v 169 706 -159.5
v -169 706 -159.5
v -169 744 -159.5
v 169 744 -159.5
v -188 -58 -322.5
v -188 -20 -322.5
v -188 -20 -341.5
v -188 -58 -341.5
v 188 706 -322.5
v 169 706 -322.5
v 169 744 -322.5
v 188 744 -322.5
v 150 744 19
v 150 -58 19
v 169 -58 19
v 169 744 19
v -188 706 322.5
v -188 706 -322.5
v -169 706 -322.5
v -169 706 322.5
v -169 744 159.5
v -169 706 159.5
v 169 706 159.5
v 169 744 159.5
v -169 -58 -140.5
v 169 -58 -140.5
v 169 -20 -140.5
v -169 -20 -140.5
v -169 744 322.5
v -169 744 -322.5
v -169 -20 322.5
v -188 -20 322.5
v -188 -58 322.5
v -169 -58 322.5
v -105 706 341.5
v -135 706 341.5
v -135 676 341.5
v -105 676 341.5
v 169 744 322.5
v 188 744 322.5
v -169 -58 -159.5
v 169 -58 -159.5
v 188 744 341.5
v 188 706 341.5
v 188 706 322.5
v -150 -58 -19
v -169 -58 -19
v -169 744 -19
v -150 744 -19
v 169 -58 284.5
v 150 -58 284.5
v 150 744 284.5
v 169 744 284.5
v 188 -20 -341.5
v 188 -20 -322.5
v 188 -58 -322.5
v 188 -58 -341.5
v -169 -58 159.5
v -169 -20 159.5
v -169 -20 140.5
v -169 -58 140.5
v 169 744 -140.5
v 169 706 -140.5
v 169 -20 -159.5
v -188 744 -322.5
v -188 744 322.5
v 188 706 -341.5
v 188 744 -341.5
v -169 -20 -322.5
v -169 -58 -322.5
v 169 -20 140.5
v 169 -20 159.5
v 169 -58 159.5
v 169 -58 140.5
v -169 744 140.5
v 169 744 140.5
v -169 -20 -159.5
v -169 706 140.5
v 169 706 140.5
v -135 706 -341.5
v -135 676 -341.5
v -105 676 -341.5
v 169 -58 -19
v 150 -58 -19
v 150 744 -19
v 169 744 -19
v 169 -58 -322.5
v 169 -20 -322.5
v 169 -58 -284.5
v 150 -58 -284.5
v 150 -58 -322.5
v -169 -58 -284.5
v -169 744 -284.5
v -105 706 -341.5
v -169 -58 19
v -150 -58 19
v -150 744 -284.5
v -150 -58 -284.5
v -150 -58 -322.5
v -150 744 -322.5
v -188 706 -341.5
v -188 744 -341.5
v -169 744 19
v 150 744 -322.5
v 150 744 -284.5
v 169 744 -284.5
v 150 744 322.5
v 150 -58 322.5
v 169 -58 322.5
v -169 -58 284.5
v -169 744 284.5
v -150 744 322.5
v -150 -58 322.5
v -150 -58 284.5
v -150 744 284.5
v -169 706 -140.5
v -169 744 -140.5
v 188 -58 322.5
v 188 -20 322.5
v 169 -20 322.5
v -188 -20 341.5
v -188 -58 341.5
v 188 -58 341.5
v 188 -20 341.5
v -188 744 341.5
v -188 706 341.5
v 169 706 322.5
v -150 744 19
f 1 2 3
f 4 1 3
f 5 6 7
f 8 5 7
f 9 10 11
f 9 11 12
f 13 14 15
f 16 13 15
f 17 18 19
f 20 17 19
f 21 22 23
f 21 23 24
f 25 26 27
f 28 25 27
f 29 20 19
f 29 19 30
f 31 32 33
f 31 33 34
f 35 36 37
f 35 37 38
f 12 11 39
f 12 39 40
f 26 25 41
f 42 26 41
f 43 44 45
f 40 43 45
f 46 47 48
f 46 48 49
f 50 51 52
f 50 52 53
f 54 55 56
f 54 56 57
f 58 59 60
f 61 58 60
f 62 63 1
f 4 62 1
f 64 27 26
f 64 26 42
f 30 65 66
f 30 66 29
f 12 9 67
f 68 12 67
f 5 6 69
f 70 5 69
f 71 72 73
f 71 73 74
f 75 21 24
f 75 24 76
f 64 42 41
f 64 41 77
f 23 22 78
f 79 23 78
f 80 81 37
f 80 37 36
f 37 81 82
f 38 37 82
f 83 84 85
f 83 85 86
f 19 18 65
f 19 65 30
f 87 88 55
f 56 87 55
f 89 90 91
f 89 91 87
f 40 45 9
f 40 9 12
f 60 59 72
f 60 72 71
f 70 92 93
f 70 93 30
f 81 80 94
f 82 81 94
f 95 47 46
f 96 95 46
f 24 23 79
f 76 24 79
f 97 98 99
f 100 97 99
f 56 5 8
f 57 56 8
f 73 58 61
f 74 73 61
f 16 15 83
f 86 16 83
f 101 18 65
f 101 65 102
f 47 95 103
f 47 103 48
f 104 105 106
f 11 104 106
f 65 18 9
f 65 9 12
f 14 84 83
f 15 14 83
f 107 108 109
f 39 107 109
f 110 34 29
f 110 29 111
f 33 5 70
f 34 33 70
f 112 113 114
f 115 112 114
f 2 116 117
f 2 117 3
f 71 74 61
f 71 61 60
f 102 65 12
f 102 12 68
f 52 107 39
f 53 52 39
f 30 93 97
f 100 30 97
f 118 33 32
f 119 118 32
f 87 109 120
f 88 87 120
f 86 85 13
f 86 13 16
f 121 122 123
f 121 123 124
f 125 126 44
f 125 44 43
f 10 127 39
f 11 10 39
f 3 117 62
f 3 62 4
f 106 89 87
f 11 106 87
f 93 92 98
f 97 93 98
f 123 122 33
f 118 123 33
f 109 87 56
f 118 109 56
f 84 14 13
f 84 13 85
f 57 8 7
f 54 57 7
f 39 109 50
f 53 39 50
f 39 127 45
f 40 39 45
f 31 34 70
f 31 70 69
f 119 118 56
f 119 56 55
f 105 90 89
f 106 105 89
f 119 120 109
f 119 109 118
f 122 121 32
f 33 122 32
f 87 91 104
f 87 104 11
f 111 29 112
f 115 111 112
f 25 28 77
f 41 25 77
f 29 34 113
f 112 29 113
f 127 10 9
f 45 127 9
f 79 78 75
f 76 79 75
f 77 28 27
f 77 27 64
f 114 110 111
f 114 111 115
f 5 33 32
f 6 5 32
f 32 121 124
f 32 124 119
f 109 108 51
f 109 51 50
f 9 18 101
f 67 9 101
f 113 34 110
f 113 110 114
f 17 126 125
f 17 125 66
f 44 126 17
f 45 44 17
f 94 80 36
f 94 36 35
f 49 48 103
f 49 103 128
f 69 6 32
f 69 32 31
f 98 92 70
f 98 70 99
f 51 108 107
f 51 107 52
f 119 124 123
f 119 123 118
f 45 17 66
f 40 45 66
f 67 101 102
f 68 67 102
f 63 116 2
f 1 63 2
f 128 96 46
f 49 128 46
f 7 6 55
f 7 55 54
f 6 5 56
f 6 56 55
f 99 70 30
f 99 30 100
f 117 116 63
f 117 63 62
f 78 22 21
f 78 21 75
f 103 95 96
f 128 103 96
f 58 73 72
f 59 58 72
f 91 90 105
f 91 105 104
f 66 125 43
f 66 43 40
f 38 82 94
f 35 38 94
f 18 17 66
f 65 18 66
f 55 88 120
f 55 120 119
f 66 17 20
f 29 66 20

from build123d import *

# Parameters (mm, degrees)
EXTRUDE_1_DEPTH        = 322.5
EXTRUDE_1_DEPTH_BACK   = 322.5
SKETCH_6_W             = 19
SKETCH_6_H             = 38
EXTRUDE_1_2_DEPTH      = 322.5
EXTRUDE_1_2_DEPTH_BACK = 322.5
EXTRUDE_1_3_DEPTH      = 322.5
EXTRUDE_1_3_DEPTH_BACK = 322.5
EXTRUDE_1_4_DEPTH      = 322.5
EXTRUDE_1_4_DEPTH_BACK = 322.5
EXTRUDE_2_DEPTH        = 188
EXTRUDE_2_DEPTH_BACK   = 188
SKETCH_8_W             = 19
SKETCH_8_H             = 38
EXTRUDE_2_2_DEPTH      = 188
EXTRUDE_2_2_DEPTH_BACK = 188
EXTRUDE_2_3_DEPTH      = 188
EXTRUDE_2_3_DEPTH_BACK = 188
EXTRUDE_2_4_DEPTH      = 188
EXTRUDE_2_4_DEPTH_BACK = 188
EXTRUDE_START          = -58
SKETCH_9_W             = 19
SKETCH_9_H             = 38
EXTRUDE_2009_DEPTH     = 802
EXTRUDE_2009_2_DEPTH   = 802
EXTRUDE_2009_3_DEPTH   = 802
EXTRUDE_2009_4_DEPTH   = 802
EXTRUDE_2009_5_DEPTH   = 802
EXTRUDE_2009_6_DEPTH   = 802
EXTRUDE_START_2        = -341.5
SKETCH_10_W            = 30
SKETCH_10_H            = 30
EXTRUDE_4_DEPTH        = 683
EXTRUDE_5_DEPTH        = 169
EXTRUDE_5_DEPTH_BACK   = 169
SKETCH_11_W            = 19
SKETCH_11_H            = 38
EXTRUDE_5_2_DEPTH      = 169
EXTRUDE_5_2_DEPTH_BACK = 169
EXTRUDE_5_3_DEPTH      = 169
EXTRUDE_5_3_DEPTH_BACK = 169
EXTRUDE_5_4_DEPTH      = 169
EXTRUDE_5_4_DEPTH_BACK = 169


with BuildPart() as part:
    # ｽｹｯﾁ6 → ﾎﾞｽ - 押し出し1 (new, two sides: drawn at the far end of the back side and taken through both)
    with BuildSketch(Plane.XY.offset(-EXTRUDE_1_DEPTH_BACK)):
        with Locations((-178.5, -39)):
            Rectangle(SKETCH_6_W, SKETCH_6_H)
    extrude(amount=EXTRUDE_1_DEPTH + EXTRUDE_1_DEPTH_BACK)


with BuildPart() as body_2:
    # ｽｹｯﾁ6 → Extrude 1 2 (new, two sides: drawn at the far end of the back side and taken through both)
    with BuildSketch(Plane.XY.offset(-EXTRUDE_1_2_DEPTH_BACK)):
        with Locations((178.5, -39)):
            Rectangle(SKETCH_6_W, SKETCH_6_H)
    extrude(amount=EXTRUDE_1_2_DEPTH + EXTRUDE_1_2_DEPTH_BACK)


with BuildPart() as body_3:
    # ｽｹｯﾁ6 → Extrude 1 3 (new, two sides: drawn at the far end of the back side and taken through both)
    with BuildSketch(Plane.XY.offset(-EXTRUDE_1_3_DEPTH_BACK)):
        with Locations((178.5, 725)):
            Rectangle(SKETCH_6_W, SKETCH_6_H)
    extrude(amount=EXTRUDE_1_3_DEPTH + EXTRUDE_1_3_DEPTH_BACK)


with BuildPart() as body_4:
    # ｽｹｯﾁ6 → Extrude 1 4 (new, two sides: drawn at the far end of the back side and taken through both)
    with BuildSketch(Plane.XY.offset(-EXTRUDE_1_4_DEPTH_BACK)):
        with Locations((-178.5, 725)):
            Rectangle(SKETCH_6_W, SKETCH_6_H)
    extrude(amount=EXTRUDE_1_4_DEPTH + EXTRUDE_1_4_DEPTH_BACK)


with BuildPart() as body_5:
    # ｽｹｯﾁ8 → ﾎﾞｽ - 押し出し2 (new, two sides: drawn at the far end of the back side and taken through both)
    with BuildSketch(Plane(origin=(0, 0, 0), x_dir=(0, 0, -1), z_dir=(1, 0, 0)).offset(-EXTRUDE_2_DEPTH_BACK)):
        with Locations((-332, -39)):
            Rectangle(SKETCH_8_W, SKETCH_8_H)
    extrude(amount=EXTRUDE_2_DEPTH + EXTRUDE_2_DEPTH_BACK)


with BuildPart() as body_6:
    # ｽｹｯﾁ8 → Extrude 2 2 (new, two sides: drawn at the far end of the back side and taken through both)
    with BuildSketch(Plane(origin=(0, 0, 0), x_dir=(0, 0, -1), z_dir=(1, 0, 0)).offset(-EXTRUDE_2_2_DEPTH_BACK)):
        with Locations((-332, 725)):
            Rectangle(SKETCH_8_W, SKETCH_8_H)
    extrude(amount=EXTRUDE_2_2_DEPTH + EXTRUDE_2_2_DEPTH_BACK)


with BuildPart() as body_7:
    # ｽｹｯﾁ8 → Extrude 2 3 (new, two sides: drawn at the far end of the back side and taken through both)
    with BuildSketch(Plane(origin=(0, 0, 0), x_dir=(0, 0, -1), z_dir=(1, 0, 0)).offset(-EXTRUDE_2_3_DEPTH_BACK)):
        with Locations((332, 725)):
            Rectangle(SKETCH_8_W, SKETCH_8_H)
    extrude(amount=EXTRUDE_2_3_DEPTH + EXTRUDE_2_3_DEPTH_BACK)


with BuildPart() as body_8:
    # ｽｹｯﾁ8 → Extrude 2 4 (new, two sides: drawn at the far end of the back side and taken through both)
    with BuildSketch(Plane(origin=(0, 0, 0), x_dir=(0, 0, -1), z_dir=(1, 0, 0)).offset(-EXTRUDE_2_4_DEPTH_BACK)):
        with Locations((332, -39)):
            Rectangle(SKETCH_8_W, SKETCH_8_H)
    extrude(amount=EXTRUDE_2_4_DEPTH + EXTRUDE_2_4_DEPTH_BACK)


with BuildPart() as body_9:
    # ｽｹｯﾁ9 → Extrude 2009 (new body)
    with BuildSketch(Plane(origin=(0, 0, 0), x_dir=(1, 0, 0), z_dir=(0, 1, 0)).offset(EXTRUDE_START)):
        with Locations((-159.5, 303.5)):
            Rectangle(SKETCH_9_W, SKETCH_9_H)
    extrude(amount=EXTRUDE_2009_DEPTH)


with BuildPart() as body_10:
    # ｽｹｯﾁ9 → Extrude 2009 2 (new body)
    with BuildSketch(Plane(origin=(0, 0, 0), x_dir=(1, 0, 0), z_dir=(0, 1, 0)).offset(EXTRUDE_START)):
        with Locations((-159.5, -303.5)):
            Rectangle(SKETCH_9_W, SKETCH_9_H)
    extrude(amount=EXTRUDE_2009_2_DEPTH)


with BuildPart() as body_11:
    # ｽｹｯﾁ9 → Extrude 2009 3 (new body)
    with BuildSketch(Plane(origin=(0, 0, 0), x_dir=(1, 0, 0), z_dir=(0, 1, 0)).offset(EXTRUDE_START)):
        with Locations((159.5, 303.5)):
            Rectangle(SKETCH_9_W, SKETCH_9_H)
    extrude(amount=EXTRUDE_2009_3_DEPTH)


with BuildPart() as body_12:
    # ｽｹｯﾁ9 → Extrude 2009 4 (new body)
    with BuildSketch(Plane(origin=(0, 0, 0), x_dir=(1, 0, 0), z_dir=(0, 1, 0)).offset(EXTRUDE_START)):
        with Locations((159.5, -303.5)):
            Rectangle(SKETCH_9_W, SKETCH_9_H)
    extrude(amount=EXTRUDE_2009_4_DEPTH)


with BuildPart() as body_13:
    # ｽｹｯﾁ9 → Extrude 2009 5 (new body)
    with BuildSketch(Plane(origin=(0, 0, 0), x_dir=(1, 0, 0), z_dir=(0, 1, 0)).offset(EXTRUDE_START)):
        with Locations((-159.5, 0)):
            Rectangle(SKETCH_9_W, SKETCH_9_H)
    extrude(amount=EXTRUDE_2009_5_DEPTH)


with BuildPart() as body_14:
    # ｽｹｯﾁ9 → Extrude 2009 6 (new body)
    with BuildSketch(Plane(origin=(0, 0, 0), x_dir=(1, 0, 0), z_dir=(0, 1, 0)).offset(EXTRUDE_START)):
        with Locations((159.5, 0)):
            Rectangle(SKETCH_9_W, SKETCH_9_H)
    extrude(amount=EXTRUDE_2009_6_DEPTH)


with BuildPart() as body_15:
    # ｽｹｯﾁ10 → ﾎﾞｽ - 押し出し4 (new body)
    with BuildSketch(Plane.XY.offset(EXTRUDE_START_2)):
        with Locations((-120, 691)):
            Rectangle(SKETCH_10_W, SKETCH_10_H)
    extrude(amount=EXTRUDE_4_DEPTH)


with BuildPart() as body_16:
    # ｽｹｯﾁ11 → ﾎﾞｽ - 押し出し5 (new, two sides: drawn at the far end of the back side and taken through both)
    with BuildSketch(Plane(origin=(0, 0, 0), x_dir=(0, 0, -1), z_dir=(1, 0, 0)).offset(-EXTRUDE_5_DEPTH_BACK)):
        with Locations((-150, 725)):
            Rectangle(SKETCH_11_W, SKETCH_11_H)
    extrude(amount=EXTRUDE_5_DEPTH + EXTRUDE_5_DEPTH_BACK)


with BuildPart() as body_17:
    # ｽｹｯﾁ11 → Extrude 5 2 (new, two sides: drawn at the far end of the back side and taken through both)
    with BuildSketch(Plane(origin=(0, 0, 0), x_dir=(0, 0, -1), z_dir=(1, 0, 0)).offset(-EXTRUDE_5_2_DEPTH_BACK)):
        with Locations((-150, -39)):
            Rectangle(SKETCH_11_W, SKETCH_11_H)
    extrude(amount=EXTRUDE_5_2_DEPTH + EXTRUDE_5_2_DEPTH_BACK)


with BuildPart() as body_18:
    # ｽｹｯﾁ11 → Extrude 5 3 (new, two sides: drawn at the far end of the back side and taken through both)
    with BuildSketch(Plane(origin=(0, 0, 0), x_dir=(0, 0, -1), z_dir=(1, 0, 0)).offset(-EXTRUDE_5_3_DEPTH_BACK)):
        with Locations((150, -39)):
            Rectangle(SKETCH_11_W, SKETCH_11_H)
    extrude(amount=EXTRUDE_5_3_DEPTH + EXTRUDE_5_3_DEPTH_BACK)


with BuildPart() as body_19:
    # ｽｹｯﾁ11 → Extrude 5 4 (new, two sides: drawn at the far end of the back side and taken through both)
    with BuildSketch(Plane(origin=(0, 0, 0), x_dir=(0, 0, -1), z_dir=(1, 0, 0)).offset(-EXTRUDE_5_4_DEPTH_BACK)):
        with Locations((150, 725)):
            Rectangle(SKETCH_11_W, SKETCH_11_H)
    extrude(amount=EXTRUDE_5_4_DEPTH + EXTRUDE_5_4_DEPTH_BACK)


solid = Compound([part.part, body_2.part, body_3.part, body_4.part, body_5.part, body_6.part, body_7.part, body_8.part, body_9.part, body_10.part, body_11.part, body_12.part, body_13.part, body_14.part, body_15.part, body_16.part, body_17.part, body_18.part, body_19.part])
